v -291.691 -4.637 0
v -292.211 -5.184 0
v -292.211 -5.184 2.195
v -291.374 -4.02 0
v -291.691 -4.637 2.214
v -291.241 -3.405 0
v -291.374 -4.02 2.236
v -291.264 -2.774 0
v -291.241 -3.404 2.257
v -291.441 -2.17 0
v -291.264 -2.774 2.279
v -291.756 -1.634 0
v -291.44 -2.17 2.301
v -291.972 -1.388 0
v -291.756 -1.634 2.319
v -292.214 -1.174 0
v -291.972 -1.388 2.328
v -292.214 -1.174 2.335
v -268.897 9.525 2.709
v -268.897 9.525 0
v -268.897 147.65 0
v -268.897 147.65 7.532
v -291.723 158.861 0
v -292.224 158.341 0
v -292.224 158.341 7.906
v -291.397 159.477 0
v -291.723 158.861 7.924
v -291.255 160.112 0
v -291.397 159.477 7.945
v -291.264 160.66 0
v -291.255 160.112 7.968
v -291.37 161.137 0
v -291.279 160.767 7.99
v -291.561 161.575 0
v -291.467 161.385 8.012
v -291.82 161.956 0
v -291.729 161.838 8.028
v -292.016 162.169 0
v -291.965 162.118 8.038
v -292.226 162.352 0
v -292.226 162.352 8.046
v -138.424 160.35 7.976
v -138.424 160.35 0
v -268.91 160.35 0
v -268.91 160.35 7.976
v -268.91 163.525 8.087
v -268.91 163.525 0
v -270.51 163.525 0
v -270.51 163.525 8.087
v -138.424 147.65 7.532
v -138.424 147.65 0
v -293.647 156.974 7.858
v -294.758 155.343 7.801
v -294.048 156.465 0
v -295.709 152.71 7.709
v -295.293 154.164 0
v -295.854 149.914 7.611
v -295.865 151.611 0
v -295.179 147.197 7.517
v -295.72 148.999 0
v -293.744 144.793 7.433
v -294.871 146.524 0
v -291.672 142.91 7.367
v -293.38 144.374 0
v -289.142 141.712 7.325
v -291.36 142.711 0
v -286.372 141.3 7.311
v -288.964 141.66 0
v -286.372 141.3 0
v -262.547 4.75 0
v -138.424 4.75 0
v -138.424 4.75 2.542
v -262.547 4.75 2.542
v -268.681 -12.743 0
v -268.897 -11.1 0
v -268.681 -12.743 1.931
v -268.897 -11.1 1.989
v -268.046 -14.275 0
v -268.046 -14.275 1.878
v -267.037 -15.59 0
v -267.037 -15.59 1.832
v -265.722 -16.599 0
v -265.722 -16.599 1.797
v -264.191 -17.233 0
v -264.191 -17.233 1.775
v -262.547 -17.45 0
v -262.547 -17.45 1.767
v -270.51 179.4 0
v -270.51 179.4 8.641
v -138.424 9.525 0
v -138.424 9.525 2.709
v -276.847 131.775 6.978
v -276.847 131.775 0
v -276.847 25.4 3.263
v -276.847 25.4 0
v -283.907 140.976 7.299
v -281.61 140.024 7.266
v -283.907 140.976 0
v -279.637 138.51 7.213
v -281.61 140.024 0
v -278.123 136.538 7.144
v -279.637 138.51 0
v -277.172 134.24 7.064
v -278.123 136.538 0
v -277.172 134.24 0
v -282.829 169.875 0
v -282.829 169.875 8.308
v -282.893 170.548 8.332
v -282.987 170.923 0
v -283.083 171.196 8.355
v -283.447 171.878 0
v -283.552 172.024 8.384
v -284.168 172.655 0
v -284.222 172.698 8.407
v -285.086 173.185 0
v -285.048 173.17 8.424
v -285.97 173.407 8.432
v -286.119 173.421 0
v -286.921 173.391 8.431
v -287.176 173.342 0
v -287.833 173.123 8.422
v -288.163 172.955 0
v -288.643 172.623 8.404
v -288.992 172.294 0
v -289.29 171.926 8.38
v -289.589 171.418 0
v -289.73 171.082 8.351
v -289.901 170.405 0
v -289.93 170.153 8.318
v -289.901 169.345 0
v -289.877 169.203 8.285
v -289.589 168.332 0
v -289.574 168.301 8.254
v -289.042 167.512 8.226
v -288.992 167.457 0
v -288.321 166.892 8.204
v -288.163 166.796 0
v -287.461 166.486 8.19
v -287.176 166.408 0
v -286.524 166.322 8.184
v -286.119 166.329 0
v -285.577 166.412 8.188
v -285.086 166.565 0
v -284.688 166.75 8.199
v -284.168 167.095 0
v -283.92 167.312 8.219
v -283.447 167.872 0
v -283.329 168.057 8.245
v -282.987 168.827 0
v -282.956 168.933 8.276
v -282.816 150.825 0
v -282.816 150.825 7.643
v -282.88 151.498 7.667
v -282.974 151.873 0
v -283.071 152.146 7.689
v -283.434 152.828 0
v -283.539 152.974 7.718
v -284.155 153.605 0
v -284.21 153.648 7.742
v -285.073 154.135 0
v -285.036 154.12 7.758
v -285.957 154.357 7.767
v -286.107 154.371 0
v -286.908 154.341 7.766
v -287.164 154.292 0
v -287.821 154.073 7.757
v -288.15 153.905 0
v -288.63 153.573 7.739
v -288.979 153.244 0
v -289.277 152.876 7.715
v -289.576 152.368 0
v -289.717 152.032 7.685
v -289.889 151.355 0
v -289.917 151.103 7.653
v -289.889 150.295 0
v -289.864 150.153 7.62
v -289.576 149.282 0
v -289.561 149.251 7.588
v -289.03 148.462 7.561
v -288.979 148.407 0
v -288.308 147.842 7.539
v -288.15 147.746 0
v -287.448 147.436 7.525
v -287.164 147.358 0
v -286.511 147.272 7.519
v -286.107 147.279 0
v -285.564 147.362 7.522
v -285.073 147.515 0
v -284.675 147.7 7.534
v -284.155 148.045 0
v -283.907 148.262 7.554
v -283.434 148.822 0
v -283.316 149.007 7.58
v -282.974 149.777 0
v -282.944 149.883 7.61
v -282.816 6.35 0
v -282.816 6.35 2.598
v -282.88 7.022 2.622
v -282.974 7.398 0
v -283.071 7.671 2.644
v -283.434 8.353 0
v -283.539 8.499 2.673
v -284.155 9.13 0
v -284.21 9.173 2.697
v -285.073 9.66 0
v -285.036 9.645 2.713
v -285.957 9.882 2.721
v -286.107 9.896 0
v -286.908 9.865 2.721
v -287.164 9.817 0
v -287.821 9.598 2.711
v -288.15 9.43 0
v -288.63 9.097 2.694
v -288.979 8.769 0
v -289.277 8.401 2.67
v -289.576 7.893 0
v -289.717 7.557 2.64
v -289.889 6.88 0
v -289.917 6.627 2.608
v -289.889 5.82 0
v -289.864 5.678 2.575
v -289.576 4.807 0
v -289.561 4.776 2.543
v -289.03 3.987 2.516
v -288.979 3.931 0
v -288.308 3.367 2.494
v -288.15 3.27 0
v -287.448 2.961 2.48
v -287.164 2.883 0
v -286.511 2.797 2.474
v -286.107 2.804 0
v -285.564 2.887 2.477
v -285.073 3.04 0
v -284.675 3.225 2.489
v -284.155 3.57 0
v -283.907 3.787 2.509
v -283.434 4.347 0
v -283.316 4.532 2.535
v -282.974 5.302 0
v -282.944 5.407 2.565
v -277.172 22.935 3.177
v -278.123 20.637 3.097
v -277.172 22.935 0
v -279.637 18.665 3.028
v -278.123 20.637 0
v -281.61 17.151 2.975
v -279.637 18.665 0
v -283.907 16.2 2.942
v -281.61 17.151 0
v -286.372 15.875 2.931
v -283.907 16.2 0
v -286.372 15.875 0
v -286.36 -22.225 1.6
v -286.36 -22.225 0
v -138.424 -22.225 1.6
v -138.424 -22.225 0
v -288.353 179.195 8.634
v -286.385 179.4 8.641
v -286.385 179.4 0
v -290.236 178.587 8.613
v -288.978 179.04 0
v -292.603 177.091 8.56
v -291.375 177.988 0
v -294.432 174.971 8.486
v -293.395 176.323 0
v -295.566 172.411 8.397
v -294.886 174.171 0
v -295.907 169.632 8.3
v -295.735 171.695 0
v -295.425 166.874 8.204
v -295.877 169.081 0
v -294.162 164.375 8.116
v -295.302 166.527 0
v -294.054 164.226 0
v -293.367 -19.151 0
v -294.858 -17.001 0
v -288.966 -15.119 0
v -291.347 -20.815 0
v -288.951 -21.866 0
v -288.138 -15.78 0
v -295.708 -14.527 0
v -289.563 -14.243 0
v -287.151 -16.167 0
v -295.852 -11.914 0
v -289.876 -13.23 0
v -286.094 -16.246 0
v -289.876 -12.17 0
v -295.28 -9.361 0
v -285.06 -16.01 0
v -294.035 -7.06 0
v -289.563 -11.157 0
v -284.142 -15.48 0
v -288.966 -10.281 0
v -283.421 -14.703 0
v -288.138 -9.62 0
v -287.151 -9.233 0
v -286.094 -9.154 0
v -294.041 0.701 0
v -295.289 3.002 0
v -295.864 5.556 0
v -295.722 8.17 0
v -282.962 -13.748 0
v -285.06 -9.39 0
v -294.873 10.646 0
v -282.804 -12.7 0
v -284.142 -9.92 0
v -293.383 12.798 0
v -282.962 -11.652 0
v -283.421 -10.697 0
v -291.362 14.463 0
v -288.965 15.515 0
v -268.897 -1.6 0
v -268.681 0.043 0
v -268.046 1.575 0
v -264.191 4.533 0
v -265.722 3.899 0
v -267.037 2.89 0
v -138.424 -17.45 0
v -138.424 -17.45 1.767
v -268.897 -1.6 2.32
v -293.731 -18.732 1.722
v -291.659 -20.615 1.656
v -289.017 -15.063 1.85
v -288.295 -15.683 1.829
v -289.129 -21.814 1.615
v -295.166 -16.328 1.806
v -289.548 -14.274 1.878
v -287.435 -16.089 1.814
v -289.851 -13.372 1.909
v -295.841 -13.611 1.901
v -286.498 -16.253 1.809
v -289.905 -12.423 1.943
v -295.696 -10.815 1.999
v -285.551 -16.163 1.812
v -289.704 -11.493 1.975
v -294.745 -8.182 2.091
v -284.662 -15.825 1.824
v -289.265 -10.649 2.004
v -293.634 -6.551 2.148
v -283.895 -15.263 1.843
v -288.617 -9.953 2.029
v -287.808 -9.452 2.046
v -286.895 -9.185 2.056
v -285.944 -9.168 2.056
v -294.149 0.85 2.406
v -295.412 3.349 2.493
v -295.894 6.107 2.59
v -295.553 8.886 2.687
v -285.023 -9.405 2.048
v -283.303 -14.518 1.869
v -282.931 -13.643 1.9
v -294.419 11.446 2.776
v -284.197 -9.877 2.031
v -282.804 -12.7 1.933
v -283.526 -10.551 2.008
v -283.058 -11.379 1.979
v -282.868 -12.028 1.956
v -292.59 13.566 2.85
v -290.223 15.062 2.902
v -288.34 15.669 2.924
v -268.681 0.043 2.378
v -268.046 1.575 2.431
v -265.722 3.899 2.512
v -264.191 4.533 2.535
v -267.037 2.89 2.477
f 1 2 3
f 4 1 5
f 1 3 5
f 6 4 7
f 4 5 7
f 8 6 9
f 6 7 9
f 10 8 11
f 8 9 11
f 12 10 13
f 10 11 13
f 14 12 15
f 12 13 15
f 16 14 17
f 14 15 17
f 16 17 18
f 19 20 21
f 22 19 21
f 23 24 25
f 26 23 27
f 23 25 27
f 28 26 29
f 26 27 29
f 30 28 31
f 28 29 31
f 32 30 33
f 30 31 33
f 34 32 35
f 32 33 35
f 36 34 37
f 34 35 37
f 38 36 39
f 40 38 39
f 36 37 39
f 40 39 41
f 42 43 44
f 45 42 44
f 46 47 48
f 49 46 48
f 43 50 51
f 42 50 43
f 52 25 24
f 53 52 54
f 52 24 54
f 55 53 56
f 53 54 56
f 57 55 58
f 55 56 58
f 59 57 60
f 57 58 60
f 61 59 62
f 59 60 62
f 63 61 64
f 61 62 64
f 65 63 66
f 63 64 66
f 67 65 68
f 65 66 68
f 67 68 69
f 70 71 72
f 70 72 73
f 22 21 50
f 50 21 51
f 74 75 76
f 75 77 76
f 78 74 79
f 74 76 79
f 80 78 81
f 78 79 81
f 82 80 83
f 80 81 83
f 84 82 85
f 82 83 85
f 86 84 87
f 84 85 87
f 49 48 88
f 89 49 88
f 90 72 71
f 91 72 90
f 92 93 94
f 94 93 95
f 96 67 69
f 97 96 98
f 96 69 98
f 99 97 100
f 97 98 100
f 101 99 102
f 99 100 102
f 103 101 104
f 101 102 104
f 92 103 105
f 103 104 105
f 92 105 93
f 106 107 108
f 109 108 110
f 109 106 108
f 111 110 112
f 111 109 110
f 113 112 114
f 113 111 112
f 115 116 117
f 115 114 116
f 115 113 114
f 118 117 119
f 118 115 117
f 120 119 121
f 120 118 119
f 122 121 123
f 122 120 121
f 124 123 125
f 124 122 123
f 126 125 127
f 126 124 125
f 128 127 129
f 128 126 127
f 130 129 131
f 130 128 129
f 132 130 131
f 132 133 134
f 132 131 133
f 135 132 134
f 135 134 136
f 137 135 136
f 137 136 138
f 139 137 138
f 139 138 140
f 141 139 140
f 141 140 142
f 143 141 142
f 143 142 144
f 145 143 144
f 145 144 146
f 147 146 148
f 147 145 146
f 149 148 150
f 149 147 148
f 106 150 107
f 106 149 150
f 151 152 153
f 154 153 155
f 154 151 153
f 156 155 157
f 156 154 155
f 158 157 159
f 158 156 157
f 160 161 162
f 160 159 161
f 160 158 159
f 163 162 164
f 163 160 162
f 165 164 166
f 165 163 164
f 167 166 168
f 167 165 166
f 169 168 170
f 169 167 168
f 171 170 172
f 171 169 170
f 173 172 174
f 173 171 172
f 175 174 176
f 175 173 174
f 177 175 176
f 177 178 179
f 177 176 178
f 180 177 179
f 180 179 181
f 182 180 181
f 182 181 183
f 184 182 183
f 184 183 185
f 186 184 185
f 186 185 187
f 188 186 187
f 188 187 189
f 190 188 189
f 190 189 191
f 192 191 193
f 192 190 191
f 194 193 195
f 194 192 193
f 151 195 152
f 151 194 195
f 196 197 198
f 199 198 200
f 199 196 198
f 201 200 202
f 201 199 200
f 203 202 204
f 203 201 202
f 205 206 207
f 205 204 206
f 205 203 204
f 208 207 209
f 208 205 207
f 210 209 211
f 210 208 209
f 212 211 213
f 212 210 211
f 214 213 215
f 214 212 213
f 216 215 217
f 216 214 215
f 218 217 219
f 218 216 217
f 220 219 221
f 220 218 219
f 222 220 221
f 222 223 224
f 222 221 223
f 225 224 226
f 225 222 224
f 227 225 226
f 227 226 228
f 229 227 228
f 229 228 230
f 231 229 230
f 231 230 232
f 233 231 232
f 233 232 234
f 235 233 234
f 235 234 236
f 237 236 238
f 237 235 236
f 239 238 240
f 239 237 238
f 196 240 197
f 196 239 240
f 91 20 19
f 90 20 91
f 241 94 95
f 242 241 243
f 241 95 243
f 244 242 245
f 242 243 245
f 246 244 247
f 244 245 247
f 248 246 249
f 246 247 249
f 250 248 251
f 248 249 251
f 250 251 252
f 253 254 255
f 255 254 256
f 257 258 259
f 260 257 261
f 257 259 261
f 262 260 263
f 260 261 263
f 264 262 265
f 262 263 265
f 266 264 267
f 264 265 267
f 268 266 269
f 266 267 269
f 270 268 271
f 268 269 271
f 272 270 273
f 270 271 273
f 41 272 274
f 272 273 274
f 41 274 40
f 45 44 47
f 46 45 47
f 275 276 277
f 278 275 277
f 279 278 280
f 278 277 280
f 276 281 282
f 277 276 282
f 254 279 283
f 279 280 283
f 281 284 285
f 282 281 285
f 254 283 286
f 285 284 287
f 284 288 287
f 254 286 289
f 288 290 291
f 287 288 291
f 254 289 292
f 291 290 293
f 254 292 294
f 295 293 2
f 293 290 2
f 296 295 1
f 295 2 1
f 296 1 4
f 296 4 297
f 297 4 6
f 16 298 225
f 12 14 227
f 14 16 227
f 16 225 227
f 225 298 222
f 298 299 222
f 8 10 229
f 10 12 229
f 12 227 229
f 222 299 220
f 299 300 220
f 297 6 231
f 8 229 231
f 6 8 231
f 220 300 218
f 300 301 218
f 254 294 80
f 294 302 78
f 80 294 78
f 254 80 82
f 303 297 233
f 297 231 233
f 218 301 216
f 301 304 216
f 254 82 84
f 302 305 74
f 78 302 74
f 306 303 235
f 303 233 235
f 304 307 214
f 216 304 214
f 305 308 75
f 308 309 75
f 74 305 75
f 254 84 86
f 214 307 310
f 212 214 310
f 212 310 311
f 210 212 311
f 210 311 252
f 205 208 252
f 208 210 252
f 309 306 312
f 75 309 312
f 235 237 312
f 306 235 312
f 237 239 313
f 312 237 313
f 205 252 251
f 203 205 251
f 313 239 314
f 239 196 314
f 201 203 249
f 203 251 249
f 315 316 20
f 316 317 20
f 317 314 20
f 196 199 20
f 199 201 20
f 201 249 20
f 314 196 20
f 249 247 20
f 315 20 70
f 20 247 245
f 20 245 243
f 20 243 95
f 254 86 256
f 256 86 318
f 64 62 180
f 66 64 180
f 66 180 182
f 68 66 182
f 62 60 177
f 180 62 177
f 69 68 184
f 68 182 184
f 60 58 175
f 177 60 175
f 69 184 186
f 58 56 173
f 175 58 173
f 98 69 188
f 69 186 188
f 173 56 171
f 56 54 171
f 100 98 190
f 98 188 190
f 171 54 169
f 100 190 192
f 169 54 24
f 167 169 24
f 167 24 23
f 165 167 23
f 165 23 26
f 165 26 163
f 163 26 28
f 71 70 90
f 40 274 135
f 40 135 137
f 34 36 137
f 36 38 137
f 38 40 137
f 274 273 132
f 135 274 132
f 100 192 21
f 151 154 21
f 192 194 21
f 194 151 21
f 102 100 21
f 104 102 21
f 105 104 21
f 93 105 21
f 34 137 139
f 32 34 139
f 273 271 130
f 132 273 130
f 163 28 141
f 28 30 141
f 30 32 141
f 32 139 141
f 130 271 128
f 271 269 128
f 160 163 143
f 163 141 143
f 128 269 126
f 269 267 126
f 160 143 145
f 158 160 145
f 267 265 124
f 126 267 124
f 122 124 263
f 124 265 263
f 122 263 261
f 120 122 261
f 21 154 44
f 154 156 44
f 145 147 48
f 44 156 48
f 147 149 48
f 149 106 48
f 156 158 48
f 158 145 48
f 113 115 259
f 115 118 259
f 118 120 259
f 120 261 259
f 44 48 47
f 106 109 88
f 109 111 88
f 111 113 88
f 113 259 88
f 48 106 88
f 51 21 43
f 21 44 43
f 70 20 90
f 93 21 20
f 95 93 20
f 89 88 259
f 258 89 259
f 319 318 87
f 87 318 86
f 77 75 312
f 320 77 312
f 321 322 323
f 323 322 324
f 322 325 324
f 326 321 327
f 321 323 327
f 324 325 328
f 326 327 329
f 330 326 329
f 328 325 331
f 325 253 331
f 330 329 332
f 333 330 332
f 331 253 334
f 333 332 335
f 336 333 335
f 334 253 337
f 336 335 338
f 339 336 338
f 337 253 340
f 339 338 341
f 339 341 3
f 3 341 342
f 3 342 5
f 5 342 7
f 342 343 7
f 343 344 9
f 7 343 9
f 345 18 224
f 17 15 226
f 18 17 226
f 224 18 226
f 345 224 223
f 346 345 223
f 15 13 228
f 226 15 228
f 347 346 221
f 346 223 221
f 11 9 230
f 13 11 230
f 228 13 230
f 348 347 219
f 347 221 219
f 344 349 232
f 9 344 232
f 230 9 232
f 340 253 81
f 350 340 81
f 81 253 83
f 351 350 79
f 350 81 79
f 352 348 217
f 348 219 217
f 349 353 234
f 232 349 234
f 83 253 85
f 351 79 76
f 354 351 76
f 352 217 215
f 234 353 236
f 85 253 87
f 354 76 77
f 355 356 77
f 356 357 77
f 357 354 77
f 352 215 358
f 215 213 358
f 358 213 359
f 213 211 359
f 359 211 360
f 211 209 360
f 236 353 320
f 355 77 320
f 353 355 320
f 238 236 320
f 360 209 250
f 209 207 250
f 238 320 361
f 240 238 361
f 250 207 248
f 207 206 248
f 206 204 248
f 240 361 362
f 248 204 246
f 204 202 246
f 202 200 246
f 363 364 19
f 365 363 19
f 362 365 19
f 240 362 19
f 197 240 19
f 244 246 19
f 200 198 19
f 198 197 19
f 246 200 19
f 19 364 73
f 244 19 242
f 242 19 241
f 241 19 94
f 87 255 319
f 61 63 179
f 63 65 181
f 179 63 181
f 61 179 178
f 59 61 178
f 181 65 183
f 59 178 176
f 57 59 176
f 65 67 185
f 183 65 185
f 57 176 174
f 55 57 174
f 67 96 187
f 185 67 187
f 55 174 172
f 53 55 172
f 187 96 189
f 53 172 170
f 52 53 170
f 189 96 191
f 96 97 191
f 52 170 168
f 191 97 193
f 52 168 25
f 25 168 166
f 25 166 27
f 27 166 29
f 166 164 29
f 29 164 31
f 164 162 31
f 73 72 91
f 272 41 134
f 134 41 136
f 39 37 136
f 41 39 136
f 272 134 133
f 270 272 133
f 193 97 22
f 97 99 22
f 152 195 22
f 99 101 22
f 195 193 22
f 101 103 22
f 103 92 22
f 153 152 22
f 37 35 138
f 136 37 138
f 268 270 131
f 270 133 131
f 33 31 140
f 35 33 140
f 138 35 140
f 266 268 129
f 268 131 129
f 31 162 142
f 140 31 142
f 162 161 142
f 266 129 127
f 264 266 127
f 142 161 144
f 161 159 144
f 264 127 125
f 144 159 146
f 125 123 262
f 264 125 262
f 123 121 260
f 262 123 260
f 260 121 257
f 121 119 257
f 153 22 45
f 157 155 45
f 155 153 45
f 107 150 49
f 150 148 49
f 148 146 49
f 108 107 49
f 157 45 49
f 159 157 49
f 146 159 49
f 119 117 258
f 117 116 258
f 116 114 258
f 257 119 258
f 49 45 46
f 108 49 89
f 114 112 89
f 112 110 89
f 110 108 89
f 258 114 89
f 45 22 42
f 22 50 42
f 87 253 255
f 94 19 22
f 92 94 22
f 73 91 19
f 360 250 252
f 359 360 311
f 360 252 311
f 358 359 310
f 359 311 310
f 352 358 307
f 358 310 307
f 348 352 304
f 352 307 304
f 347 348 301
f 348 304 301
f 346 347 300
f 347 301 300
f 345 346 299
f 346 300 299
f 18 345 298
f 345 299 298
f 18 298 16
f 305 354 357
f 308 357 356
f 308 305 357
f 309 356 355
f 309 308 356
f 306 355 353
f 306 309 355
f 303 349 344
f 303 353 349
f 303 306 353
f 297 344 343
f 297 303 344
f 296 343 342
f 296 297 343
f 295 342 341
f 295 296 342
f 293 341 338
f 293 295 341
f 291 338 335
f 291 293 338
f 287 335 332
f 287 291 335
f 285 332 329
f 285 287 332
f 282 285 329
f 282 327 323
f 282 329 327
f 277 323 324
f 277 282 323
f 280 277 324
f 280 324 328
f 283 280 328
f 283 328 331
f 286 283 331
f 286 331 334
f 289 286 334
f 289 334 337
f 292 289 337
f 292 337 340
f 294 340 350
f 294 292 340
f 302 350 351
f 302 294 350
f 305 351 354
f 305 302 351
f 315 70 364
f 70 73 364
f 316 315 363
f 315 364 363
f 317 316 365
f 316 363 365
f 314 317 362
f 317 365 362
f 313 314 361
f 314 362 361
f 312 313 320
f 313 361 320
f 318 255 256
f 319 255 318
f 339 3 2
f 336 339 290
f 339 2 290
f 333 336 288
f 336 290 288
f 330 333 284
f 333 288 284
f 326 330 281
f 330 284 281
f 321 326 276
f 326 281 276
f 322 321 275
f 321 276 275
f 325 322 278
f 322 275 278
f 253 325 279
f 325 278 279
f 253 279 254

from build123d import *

# Parameters (mm, degrees)
BOSS_EXTRUDE1_OUTLINE_R = 3.556
BOSS_EXTRUDE1_OUTLINE_W = 260.9469
BOSS_EXTRUDE1_OUTLINE_H = 138.1252
BOSS_EXTRUDE1_DEPTH     = 76.2
CUT_EXTRUDE1_DEPTH      = 355.32482824
CUT_EXTRUDE1_DEPTH_BACK = 355.32482824
FILLET1_R               = 2.54
SKETCH7_W               = 260.9469
SKETCH7_H               = 22.1996
CUT_EXTRUDE2_DEPTH      = 347.152897849
FILLET2_R               = 6.35
SKETCH8_W               = 217.439036591
SKETCH8_H               = 235.521960295
CUT_EXTRUDE4_DEPTH      = 347.144751077


# Read off the part's stored shape, not the designer's step: Boss-Extrude1
with BuildPart() as part:
    # Boss-Extrude1 outline → Boss-Extrude1 (new body)
    with BuildSketch(Plane.XY):
        with BuildLine():
            Line((-286.3596, -22.225), (9.525, -22.225))
            ThreePointArc((9.525, -22.225), (19.05, -12.7), (9.525, -3.175))
            ThreePointArc((9.525, -3.175), (19.05, 6.35), (9.525, 15.875))
            ThreePointArc((9.525, 15.875), (2.789807909, 18.664807909), (0, 25.4))
            Line((0, 25.4), (0, 131.7752))
            ThreePointArc((0, 131.7752), (2.789807909, 138.510392091), (9.525, 141.3002))
            ThreePointArc((9.525, 141.3002), (19.05, 150.8252), (9.525, 160.3502))
            ThreePointArc((9.525, 160.3502), (19.05, 169.8752), (9.525, 179.4002))
            Line((9.525, 179.4002), (-6.35, 179.4002))
            Line((-6.35, 179.4002), (-6.35, 163.5252))
            Line((-6.35, 163.5252), (-7.9502, 163.5252))
            Line((-7.9502, 163.5252), (-7.9502, 160.3502))
            Line((-7.9502, 160.3502), (-268.9098, 160.3502))
            Line((-268.9098, 160.3502), (-268.9098, 163.5252))
            Line((-268.9098, 163.5252), (-270.51, 163.5252))
            Line((-270.51, 163.5252), (-270.51, 179.4002))
            Line((-270.51, 179.4002), (-286.385, 179.4002))
            ThreePointArc((-286.385, 179.4002), (-295.91, 169.8752), (-286.385, 160.3502))
            ThreePointArc((-286.385, 160.3502), (-295.897297883, 150.818850004), (-286.3723, 141.3002))
            ThreePointArc((-286.3723, 141.3002), (-279.637107909, 138.510392091), (-276.8473, 131.7752))
            Line((-276.8473, 131.7752), (-276.8473, 25.4))
            ThreePointArc((-276.8473, 25.4), (-279.637107909, 18.664807909), (-286.3723, 15.875))
            ThreePointArc((-286.3723, 15.875), (-295.8973, 6.35), (-286.3723, -3.175))
            ThreePointArc((-286.3723, -3.175), (-295.884597883, -12.706349996), (-286.3596, -22.225))
        make_face()
        with Locations((-286.3596, -12.7)):
            Circle(BOSS_EXTRUDE1_OUTLINE_R, mode=Mode.SUBTRACT)
        with Locations((-286.3723, 6.35)):
            Circle(BOSS_EXTRUDE1_OUTLINE_R, mode=Mode.SUBTRACT)
        with Locations((9.525, -12.7)):
            Circle(BOSS_EXTRUDE1_OUTLINE_R, mode=Mode.SUBTRACT)
        with Locations((9.525, 6.35)):
            Circle(BOSS_EXTRUDE1_OUTLINE_R, mode=Mode.SUBTRACT)
        with Locations((-286.3723, 150.8252)):
            Circle(BOSS_EXTRUDE1_OUTLINE_R, mode=Mode.SUBTRACT)
        with Locations((-286.385, 169.8752)):
            Circle(BOSS_EXTRUDE1_OUTLINE_R, mode=Mode.SUBTRACT)
        with Locations((-138.42365, 78.5876)):
            Rectangle(BOSS_EXTRUDE1_OUTLINE_W, BOSS_EXTRUDE1_OUTLINE_H, mode=Mode.SUBTRACT)
        with Locations((9.525, 150.8252)):
            Circle(BOSS_EXTRUDE1_OUTLINE_R, mode=Mode.SUBTRACT)
        with Locations((9.525, 169.8752)):
            Circle(BOSS_EXTRUDE1_OUTLINE_R, mode=Mode.SUBTRACT)
    extrude(amount=BOSS_EXTRUDE1_DEPTH)

    # Sketch5 → Cut-Extrude1 (cut, two sides: drawn at the far end of the back side and taken through both)
    with BuildSketch(Plane.ZY.offset(276.8473).offset(-CUT_EXTRUDE1_DEPTH_BACK)):
        Polygon((1.6002, -22.225), (8.641107133, 179.4002), (76.2, 179.4002), (76.2, -22.225), align=None)
    extrude(amount=CUT_EXTRUDE1_DEPTH + CUT_EXTRUDE1_DEPTH_BACK, mode=Mode.SUBTRACT)

    # Fillet1
    fillet1_edges = [part.edges().sort_by_distance(p)[0] for p in [
        (-286.385, 160.3502, 3.987933237),
        (-286.3723, -3.175, 1.132720329),
        (9.525, -3.175, 1.132720329),
        (9.525, 160.3502, 3.987933237),
    ]]
    fillet(fillet1_edges, radius=FILLET1_R)

    # Sketch7 → Cut-Extrude2 (cut, through all)
    with BuildSketch(Plane(origin=(0, 0, 0), x_dir=(-1, 0, 0), z_dir=(0, 0, -1))):
        with Locations((138.42365, -6.35)):
            Rectangle(SKETCH7_W, SKETCH7_H)
    extrude(amount=-CUT_EXTRUDE2_DEPTH, mode=Mode.SUBTRACT)

    # Fillet2
    fillet2_edges = [part.edges().sort_by_distance(p)[0] for p in [
        (-268.8971, 4.7498, 1.271090386),
        (-268.8971, -17.4498, 0.883476829),
        (-7.9502, -17.4498, 0.883476829),
        (-7.9502, 4.7498, 1.271090386),
    ]]
    fillet(fillet2_edges, radius=FILLET2_R)

    # Sketch8 → Cut-Extrude4 (cut, through all)
    with BuildSketch(Plane(origin=(0, -0.082881646, 2.373419811), x_dir=(1, 0, 0), z_dir=(0, -0.03489949670250444, 0.9993908270190958))):
        with Locations((-29.704131704, 74.917246318)):
            Rectangle(SKETCH8_W, SKETCH8_H)
    extrude(amount=-CUT_EXTRUDE4_DEPTH, mode=Mode.SUBTRACT)


solid = part.part
